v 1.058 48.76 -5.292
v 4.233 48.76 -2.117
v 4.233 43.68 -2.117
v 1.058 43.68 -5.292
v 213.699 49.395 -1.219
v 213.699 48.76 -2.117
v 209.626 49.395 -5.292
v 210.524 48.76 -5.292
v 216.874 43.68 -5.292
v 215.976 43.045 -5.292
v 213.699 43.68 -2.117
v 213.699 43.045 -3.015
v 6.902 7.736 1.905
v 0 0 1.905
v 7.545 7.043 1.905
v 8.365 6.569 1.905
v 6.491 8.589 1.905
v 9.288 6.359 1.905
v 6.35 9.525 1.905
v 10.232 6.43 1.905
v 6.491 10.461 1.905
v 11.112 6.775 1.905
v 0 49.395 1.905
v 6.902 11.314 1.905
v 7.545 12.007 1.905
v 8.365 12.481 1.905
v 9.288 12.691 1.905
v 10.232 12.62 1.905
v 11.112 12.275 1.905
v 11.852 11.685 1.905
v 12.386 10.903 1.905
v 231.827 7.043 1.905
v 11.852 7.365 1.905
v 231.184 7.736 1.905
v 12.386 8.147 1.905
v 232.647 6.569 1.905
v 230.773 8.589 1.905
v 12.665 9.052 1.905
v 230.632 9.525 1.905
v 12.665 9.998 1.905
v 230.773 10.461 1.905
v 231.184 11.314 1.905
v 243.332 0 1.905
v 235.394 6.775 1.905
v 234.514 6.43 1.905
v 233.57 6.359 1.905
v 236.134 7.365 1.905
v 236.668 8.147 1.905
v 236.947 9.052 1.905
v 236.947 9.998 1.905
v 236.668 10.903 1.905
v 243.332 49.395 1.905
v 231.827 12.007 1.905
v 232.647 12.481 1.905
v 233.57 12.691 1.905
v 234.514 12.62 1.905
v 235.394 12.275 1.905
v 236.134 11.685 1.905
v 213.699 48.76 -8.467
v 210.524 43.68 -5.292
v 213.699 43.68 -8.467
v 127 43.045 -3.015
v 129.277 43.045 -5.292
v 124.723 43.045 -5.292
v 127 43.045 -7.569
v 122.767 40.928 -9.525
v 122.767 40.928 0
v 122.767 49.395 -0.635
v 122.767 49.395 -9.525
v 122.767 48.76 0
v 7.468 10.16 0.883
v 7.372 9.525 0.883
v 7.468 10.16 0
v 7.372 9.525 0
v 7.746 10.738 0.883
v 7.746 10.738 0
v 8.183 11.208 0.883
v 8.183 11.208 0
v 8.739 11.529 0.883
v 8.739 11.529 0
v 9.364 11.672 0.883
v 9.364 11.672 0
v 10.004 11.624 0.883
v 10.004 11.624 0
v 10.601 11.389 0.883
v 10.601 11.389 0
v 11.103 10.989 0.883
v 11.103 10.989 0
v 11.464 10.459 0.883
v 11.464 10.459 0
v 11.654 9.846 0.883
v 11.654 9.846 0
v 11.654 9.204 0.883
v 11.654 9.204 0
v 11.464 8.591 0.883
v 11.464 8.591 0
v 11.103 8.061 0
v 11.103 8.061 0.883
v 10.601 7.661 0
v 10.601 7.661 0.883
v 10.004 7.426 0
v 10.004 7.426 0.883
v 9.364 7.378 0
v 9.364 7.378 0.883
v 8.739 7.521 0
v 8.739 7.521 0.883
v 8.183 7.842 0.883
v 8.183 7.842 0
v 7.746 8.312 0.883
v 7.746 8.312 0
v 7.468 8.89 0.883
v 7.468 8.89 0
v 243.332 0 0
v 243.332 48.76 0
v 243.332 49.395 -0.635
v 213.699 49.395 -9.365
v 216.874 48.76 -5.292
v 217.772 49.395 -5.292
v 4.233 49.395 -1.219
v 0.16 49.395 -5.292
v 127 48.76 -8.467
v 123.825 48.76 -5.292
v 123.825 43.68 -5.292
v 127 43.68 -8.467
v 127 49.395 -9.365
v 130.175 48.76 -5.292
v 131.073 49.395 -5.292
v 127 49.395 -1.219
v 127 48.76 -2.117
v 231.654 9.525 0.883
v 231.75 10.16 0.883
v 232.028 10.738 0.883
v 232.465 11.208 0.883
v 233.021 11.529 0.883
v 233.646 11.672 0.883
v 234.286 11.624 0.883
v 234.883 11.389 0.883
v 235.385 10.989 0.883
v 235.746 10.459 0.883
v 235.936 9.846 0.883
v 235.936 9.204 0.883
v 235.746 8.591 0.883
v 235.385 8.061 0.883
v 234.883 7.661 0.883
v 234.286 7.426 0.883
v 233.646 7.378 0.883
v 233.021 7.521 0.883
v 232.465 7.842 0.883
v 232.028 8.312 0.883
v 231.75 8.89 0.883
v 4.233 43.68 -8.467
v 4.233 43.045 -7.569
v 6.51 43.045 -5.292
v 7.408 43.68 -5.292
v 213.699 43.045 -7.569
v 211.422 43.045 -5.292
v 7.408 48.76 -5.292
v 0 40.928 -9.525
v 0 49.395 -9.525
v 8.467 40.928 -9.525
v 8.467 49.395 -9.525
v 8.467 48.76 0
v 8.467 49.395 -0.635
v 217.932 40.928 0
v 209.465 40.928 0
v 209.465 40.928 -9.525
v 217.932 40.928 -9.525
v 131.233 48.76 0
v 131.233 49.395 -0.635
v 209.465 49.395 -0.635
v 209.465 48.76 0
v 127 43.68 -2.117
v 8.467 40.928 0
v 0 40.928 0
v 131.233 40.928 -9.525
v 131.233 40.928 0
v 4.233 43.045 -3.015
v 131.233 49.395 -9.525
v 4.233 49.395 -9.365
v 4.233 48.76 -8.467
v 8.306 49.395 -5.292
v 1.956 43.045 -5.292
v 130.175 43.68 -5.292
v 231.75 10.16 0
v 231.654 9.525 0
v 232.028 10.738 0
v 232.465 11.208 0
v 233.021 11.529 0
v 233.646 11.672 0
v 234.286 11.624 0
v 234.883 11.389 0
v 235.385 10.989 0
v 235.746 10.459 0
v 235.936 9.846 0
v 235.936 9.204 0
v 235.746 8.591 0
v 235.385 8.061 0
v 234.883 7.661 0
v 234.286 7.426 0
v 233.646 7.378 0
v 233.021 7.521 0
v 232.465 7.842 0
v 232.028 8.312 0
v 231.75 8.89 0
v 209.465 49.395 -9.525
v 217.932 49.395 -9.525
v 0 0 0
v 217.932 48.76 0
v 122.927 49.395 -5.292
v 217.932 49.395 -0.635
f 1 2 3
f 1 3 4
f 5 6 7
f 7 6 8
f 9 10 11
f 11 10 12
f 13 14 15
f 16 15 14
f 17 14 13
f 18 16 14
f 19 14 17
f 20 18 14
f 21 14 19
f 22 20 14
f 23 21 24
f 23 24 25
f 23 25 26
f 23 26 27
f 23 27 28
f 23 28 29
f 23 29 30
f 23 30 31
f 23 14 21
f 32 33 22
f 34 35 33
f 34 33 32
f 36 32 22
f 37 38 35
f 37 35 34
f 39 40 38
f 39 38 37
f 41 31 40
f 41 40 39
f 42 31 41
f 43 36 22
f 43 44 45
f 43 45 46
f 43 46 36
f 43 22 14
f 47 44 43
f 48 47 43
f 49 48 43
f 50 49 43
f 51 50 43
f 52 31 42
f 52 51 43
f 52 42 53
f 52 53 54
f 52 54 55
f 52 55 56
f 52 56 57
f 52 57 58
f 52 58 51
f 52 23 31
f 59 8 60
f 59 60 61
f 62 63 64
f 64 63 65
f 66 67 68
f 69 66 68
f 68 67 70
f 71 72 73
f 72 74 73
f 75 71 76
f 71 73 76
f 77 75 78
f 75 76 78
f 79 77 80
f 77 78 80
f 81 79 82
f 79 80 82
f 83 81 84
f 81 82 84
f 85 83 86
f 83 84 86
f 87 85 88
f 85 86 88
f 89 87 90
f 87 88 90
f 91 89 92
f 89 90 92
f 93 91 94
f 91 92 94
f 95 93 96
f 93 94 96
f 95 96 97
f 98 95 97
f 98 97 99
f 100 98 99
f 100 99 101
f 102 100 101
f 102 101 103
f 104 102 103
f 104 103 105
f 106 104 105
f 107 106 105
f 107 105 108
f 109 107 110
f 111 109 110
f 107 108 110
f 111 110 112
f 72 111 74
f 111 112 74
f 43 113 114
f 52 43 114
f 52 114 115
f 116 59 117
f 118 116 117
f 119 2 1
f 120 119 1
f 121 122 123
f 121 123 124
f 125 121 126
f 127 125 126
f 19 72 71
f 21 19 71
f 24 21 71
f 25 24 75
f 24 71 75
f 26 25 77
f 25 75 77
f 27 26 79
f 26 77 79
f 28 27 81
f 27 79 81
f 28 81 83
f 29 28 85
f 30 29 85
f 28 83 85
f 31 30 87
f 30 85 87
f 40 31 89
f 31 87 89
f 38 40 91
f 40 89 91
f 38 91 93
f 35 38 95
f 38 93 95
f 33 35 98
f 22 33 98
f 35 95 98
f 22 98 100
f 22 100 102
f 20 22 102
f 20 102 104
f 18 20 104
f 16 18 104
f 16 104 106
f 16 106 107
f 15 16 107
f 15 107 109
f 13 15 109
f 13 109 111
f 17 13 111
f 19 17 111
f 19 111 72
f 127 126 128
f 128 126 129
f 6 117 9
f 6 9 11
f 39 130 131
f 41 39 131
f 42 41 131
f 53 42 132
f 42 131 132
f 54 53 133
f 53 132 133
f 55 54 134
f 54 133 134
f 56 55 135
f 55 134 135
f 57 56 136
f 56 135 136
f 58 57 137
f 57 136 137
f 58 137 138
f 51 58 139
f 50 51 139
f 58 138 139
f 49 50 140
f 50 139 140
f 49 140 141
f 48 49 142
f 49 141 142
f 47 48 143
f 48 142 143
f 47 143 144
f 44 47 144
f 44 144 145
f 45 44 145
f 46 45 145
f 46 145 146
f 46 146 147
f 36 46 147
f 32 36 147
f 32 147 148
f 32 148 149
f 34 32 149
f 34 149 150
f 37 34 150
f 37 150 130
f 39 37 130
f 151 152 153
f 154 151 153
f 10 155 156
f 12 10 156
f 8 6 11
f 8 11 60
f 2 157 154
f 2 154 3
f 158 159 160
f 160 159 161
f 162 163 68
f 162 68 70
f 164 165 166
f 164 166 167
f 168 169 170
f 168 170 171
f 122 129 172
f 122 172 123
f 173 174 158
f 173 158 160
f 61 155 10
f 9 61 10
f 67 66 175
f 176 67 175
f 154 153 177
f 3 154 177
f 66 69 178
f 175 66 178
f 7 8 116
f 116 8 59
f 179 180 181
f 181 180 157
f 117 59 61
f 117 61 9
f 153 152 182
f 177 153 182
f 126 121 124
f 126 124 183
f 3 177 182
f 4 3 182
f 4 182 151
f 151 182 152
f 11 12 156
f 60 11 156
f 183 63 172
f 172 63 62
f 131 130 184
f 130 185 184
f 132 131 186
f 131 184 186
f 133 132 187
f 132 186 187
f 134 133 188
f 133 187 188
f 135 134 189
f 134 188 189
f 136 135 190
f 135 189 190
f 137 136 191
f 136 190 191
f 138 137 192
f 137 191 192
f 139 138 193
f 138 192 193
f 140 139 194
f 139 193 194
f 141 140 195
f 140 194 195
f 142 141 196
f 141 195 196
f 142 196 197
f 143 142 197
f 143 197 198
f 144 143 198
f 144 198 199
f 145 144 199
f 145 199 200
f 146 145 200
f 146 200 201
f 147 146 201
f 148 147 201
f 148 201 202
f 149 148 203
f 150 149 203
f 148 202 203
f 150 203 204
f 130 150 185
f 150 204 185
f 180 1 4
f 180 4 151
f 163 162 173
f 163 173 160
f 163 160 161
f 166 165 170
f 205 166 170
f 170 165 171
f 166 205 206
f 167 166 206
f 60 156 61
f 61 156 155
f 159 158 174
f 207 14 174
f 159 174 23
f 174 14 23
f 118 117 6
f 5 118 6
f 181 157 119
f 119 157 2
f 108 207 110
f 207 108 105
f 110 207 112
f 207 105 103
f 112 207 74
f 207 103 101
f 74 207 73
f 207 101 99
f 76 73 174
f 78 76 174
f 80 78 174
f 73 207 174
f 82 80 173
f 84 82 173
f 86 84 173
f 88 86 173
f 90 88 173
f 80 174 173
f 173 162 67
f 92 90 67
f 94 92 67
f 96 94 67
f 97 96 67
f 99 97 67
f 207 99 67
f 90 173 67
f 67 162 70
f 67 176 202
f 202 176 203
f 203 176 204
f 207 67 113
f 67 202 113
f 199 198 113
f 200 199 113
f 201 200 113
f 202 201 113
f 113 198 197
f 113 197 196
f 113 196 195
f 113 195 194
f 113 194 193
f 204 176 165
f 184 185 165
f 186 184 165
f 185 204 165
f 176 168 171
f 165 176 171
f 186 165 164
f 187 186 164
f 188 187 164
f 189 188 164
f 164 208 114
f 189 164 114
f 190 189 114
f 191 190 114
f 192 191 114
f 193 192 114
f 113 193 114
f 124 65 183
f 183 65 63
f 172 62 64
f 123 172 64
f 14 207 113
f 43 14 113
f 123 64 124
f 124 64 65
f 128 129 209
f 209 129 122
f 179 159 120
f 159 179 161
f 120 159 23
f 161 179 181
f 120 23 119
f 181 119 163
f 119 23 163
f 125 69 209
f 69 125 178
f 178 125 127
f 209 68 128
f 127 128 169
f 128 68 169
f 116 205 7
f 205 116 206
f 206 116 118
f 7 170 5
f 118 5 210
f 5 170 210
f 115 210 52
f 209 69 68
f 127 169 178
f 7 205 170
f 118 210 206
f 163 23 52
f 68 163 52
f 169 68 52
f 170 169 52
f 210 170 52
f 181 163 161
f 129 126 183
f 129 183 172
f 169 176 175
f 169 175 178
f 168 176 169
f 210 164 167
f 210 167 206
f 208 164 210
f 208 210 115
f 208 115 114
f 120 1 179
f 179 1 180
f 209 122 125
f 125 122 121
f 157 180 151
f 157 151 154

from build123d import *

# Parameters (mm, degrees)
SKETCH1_W                       = 243.332
SKETCH1_H                       = 49.394999
BOSS_EXTRUDE1_DEPTH             = 1.905
SKETCH2_W                       = 8.466666667
SKETCH2_H                       = 8.466666667
SKETCH2_W_2                     = 8.466666666
BOSS_EXTRUDE2_DEPTH             = 9.525
CUT_EXTRUDE1_DEPTH              = 6.35
CHAMFER1_SIZE                   = 0.635
BOSS_EXTRUDE3_START             = -234.865333
BOSS_EXTRUDE3_DEPTH             = 234.865333
F_6_CLEARANCE_HOLE1_D           = 4.3053
F_6_CLEARANCE_HOLE1_CSINK_D     = 6.35
F_6_CLEARANCE_HOLE1_CSINK_ANGLE = 90


with BuildPart() as part:
    # Sketch1 → Boss-Extrude1 (new body)
    with BuildSketch(Plane.XY):
        with Locations((121.666, 24.6974995)):
            Rectangle(SKETCH1_W, SKETCH1_H)
    extrude(amount=BOSS_EXTRUDE1_DEPTH)

    # Sketch2 → Boss-Extrude2 (add)
    with BuildSketch(Plane.XY):
        with Locations((4.233333334, 45.161665666)):
            Rectangle(SKETCH2_W, SKETCH2_H)
        with Locations((127, 45.161665666)):
            Rectangle(SKETCH2_W_2, SKETCH2_H)
        with Locations((213.698666667, 45.161665666)):
            Rectangle(SKETCH2_W, SKETCH2_H)
    extrude(amount=-BOSS_EXTRUDE2_DEPTH)

    # Sketch3 → Cut-Extrude1 (cut)
    with BuildSketch(Plane(origin=(0, 49.394999, 0), x_dir=(1, 0, 0), z_dir=(0, 1, 0))):
        Polygon((1.058333333, 5.291666667), (4.233333333, 8.466666667), (7.408333333, 5.291666667), (4.233333333, 2.116666667), align=None)
        Polygon((123.825, 5.291666667), (127, 8.466666667), (130.175, 5.291666667), (127, 2.116666667), align=None)
        Polygon((210.523666667, 5.291666667), (213.698666667, 8.466666667), (216.873666667, 5.291666667), (213.698666667, 2.116666667), align=None)
    extrude(amount=-CUT_EXTRUDE1_DEPTH, mode=Mode.SUBTRACT)

    # Chamfer1
    chamfer1_edges = [part.edges().sort_by_distance(p)[0] for p in [
        (2.645833333, 43.044999, -3.704166667),
        (2.645833333, 43.044999, -6.879166667),
        (5.820833333, 43.044999, -6.879166667),
        (5.820833333, 43.044999, -3.704166667),
        (2.645833333, 49.394999, -3.704166667),
        (5.820833333, 49.394999, -3.704166667),
        (5.820833333, 49.394999, -6.879166667),
        (2.645833333, 49.394999, -6.879166667),
        (125.4125, 43.044999, -3.704166667),
        (125.4125, 43.044999, -6.879166667),
        (128.5875, 43.044999, -6.879166667),
        (128.5875, 43.044999, -3.704166667),
        (125.4125, 49.394999, -3.704166667),
        (128.5875, 49.394999, -3.704166667),
        (128.5875, 49.394999, -6.879166667),
        (125.4125, 49.394999, -6.879166667),
        (212.111166667, 43.044999, -3.704166667),
        (212.111166667, 43.044999, -6.879166667),
        (215.286166667, 43.044999, -6.879166667),
        (215.286166667, 43.044999, -3.704166667),
        (212.111166667, 49.394999, -3.704166667),
        (215.286166667, 49.394999, -3.704166667),
        (215.286166667, 49.394999, -6.879166667),
        (212.111166667, 49.394999, -6.879166667),
    ]]
    chamfer(chamfer1_edges, length=CHAMFER1_SIZE)


with BuildPart() as boss_extrude3_tool:
    # Sketch4 → Boss-Extrude3 (new body)
    with BuildSketch(Plane(origin=(243.332, 0, 0), x_dir=(0, 0, -1), z_dir=(1, 0, 0)).offset(BOSS_EXTRUDE3_START)):
        Polygon((0, 49.394999), (0.635, 49.394999), (0, 48.759999), align=None)
    extrude(amount=BOSS_EXTRUDE3_DEPTH)


with BuildPart() as part_1:
    add(part.part)


with BuildPart() as part_2:
    # Boss-Extrude3: joined with boss_extrude3_tool
    add(part_1.part.fuse(boss_extrude3_tool.part, tol=0.00001))

    # #6 Clearance Hole1 (through all)
    with Locations(Plane.XY.offset(1.905)):
        with Locations((9.525, 9.525), (233.807, 9.525)):
            CounterSinkHole(F_6_CLEARANCE_HOLE1_D / 2, F_6_CLEARANCE_HOLE1_CSINK_D / 2, counter_sink_angle=F_6_CLEARANCE_HOLE1_CSINK_ANGLE)


solid = part_2.part
